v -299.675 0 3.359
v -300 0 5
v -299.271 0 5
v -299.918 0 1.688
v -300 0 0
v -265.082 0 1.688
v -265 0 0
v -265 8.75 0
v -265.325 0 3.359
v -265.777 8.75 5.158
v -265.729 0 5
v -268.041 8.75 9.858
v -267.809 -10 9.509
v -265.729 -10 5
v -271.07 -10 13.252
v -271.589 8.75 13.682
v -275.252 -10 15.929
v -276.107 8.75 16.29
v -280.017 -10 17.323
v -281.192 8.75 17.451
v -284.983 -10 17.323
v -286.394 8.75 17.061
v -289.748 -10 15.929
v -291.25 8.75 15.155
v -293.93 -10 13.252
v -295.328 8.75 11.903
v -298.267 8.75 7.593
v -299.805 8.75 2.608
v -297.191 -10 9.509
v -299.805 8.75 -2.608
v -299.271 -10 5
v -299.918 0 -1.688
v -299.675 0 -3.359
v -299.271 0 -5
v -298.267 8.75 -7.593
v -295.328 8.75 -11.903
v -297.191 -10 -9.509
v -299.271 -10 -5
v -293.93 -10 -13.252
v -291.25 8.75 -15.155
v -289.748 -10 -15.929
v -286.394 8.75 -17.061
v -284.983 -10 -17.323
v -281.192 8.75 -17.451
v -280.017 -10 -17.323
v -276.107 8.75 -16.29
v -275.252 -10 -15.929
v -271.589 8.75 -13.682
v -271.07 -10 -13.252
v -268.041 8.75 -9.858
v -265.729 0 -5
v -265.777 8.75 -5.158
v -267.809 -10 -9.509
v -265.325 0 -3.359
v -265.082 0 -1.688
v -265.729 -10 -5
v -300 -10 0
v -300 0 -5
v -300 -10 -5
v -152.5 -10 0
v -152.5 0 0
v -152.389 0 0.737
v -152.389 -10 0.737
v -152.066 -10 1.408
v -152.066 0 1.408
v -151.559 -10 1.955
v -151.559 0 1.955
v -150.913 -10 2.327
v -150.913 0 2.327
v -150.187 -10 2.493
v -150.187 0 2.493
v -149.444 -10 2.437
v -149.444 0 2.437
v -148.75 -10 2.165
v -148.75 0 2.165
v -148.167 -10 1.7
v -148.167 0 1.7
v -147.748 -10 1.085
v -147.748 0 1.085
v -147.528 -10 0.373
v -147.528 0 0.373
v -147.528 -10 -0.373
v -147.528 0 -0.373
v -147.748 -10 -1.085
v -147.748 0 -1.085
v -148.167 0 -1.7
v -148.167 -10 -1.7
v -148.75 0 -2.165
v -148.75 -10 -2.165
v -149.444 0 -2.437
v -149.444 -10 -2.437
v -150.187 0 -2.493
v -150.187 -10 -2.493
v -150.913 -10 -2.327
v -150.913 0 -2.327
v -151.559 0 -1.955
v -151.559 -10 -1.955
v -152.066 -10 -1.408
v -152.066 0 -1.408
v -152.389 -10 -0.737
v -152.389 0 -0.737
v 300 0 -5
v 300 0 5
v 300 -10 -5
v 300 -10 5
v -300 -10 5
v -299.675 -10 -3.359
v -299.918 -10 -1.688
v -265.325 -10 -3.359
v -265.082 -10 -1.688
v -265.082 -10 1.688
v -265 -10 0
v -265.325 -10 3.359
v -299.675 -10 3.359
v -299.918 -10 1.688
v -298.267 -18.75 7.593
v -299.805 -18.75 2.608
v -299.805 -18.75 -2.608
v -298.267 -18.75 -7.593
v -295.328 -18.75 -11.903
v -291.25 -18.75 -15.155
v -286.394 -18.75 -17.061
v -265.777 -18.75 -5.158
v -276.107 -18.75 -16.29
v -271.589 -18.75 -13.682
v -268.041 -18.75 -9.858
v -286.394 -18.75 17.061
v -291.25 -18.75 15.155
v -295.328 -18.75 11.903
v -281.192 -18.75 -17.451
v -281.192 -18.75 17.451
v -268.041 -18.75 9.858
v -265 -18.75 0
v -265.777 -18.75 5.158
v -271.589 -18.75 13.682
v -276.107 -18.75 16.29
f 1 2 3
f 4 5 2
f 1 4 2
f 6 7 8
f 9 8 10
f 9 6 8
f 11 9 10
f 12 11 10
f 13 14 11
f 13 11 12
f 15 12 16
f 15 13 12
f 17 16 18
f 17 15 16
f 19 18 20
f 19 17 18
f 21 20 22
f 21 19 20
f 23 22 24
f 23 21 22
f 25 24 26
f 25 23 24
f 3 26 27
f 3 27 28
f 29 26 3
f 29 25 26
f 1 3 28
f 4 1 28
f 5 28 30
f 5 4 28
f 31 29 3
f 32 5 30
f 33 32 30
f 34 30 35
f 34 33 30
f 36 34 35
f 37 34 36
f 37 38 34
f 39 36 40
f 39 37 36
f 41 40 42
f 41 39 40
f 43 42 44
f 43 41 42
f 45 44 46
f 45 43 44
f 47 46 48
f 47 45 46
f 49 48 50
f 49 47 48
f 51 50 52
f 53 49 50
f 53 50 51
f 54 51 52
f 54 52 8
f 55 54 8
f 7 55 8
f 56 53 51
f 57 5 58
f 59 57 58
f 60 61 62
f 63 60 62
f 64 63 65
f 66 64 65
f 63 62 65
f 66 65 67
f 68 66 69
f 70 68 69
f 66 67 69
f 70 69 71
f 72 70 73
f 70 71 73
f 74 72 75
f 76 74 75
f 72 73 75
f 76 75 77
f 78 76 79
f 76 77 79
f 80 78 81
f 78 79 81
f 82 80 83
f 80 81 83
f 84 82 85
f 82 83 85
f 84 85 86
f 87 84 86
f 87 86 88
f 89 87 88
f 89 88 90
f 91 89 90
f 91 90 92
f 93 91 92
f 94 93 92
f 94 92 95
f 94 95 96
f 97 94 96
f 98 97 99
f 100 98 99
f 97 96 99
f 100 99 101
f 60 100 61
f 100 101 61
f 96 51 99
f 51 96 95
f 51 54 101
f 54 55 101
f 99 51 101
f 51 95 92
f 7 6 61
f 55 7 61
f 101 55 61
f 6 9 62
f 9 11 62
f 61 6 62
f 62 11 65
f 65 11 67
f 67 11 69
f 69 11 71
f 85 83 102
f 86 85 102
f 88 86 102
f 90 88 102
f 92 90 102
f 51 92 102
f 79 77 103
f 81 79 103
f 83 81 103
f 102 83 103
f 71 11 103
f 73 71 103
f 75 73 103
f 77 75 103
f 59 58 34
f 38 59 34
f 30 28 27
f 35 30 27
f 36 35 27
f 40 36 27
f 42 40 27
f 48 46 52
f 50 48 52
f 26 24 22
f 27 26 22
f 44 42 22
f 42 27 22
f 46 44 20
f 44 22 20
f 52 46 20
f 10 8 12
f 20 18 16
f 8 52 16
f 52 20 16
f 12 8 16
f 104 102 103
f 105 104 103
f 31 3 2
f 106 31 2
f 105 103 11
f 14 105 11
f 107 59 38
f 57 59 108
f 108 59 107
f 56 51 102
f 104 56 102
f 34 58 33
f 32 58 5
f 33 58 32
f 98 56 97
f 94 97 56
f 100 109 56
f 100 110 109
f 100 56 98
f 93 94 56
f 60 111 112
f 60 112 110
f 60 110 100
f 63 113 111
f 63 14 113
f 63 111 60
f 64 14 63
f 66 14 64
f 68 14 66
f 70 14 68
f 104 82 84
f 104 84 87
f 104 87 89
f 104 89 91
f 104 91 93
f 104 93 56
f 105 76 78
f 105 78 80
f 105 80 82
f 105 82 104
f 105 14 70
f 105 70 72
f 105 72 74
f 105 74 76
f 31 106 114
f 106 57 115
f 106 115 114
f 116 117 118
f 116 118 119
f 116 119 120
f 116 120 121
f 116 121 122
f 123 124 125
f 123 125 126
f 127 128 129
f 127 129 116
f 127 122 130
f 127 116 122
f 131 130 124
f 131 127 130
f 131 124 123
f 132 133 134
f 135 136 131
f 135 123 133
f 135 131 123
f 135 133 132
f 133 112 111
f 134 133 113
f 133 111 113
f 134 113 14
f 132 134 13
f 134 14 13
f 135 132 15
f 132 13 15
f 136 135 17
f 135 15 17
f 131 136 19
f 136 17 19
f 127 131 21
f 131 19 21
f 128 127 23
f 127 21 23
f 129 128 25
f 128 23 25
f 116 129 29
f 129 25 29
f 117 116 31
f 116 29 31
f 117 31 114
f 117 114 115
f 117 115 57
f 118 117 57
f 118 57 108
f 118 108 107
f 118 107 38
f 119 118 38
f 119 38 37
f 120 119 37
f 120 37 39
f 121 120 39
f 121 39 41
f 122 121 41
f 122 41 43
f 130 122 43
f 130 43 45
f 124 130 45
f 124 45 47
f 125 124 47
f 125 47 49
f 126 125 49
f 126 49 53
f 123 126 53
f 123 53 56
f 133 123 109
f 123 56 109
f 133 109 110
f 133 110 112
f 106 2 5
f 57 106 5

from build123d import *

# Parameters (mm, degrees)
F1_DEPTH      = 10
F3_DEPTH      = 8.75
F3_DEPTH_BACK = 18.75


with BuildPart() as f1:
    # F0 (on Front) → F1 (new body)
    with BuildSketch(Plane.XZ):
        with BuildLine():
            Line((-150, -5), (300, -5))
            Line((300, -5), (300, 5))
            Line((300, 5), (-150, 5))
            ThreePointArc((-150, 5), (-146.464466, 3.535534), (-145, 0))
            ThreePointArc((-145, 0), (-146.464466, -3.535534), (-150, -5))
        make_face()
        with BuildLine():
            Line((-300, -5), (-150, -5))
            ThreePointArc((-150, -5), (-153.535534, -3.535534), (-155, 0))
            Line((-155, 0), (-300, 0))
            Line((-300, 0), (-300, -5))
        make_face()
        with BuildLine():
            Line((-300, 0), (-155, 0))
            ThreePointArc((-155, 0), (-153.535534, 3.535534), (-150, 5))
            Line((-150, 5), (-300, 5))
            Line((-300, 5), (-300, 0))
        make_face()
        with BuildLine():
            ThreePointArc((-155, 0), (-153.535534, -3.535534), (-150, -5))
            ThreePointArc((-150, -5), (-146.464466, -3.535534), (-145, 0))
            ThreePointArc((-145, 0), (-146.464466, 3.535534), (-150, 5))
            ThreePointArc((-150, 5), (-153.535534, 3.535534), (-155, 0))
        make_face()
        with BuildLine():
            ThreePointArc((-147.5, 0), (-150, -2.5), (-152.5, 0))
            ThreePointArc((-152.5, 0), (-150, 2.5), (-147.5, 0))
        make_face(mode=Mode.SUBTRACT)
    extrude(amount=F1_DEPTH)

    # F2 (on face) → F3 (join, two sides)
    with BuildSketch(Plane.XZ.offset(10)) as f3_sk:
        with BuildLine():
            ThreePointArc((-300, 0), (-282.5, -17.5), (-265, 0))
            ThreePointArc((-265, 0), (-282.5, 17.5), (-300, 0))
        make_face()
    extrude(amount=F3_DEPTH)
    extrude(f3_sk.sketch, amount=-F3_DEPTH_BACK)


solid = f1.part
